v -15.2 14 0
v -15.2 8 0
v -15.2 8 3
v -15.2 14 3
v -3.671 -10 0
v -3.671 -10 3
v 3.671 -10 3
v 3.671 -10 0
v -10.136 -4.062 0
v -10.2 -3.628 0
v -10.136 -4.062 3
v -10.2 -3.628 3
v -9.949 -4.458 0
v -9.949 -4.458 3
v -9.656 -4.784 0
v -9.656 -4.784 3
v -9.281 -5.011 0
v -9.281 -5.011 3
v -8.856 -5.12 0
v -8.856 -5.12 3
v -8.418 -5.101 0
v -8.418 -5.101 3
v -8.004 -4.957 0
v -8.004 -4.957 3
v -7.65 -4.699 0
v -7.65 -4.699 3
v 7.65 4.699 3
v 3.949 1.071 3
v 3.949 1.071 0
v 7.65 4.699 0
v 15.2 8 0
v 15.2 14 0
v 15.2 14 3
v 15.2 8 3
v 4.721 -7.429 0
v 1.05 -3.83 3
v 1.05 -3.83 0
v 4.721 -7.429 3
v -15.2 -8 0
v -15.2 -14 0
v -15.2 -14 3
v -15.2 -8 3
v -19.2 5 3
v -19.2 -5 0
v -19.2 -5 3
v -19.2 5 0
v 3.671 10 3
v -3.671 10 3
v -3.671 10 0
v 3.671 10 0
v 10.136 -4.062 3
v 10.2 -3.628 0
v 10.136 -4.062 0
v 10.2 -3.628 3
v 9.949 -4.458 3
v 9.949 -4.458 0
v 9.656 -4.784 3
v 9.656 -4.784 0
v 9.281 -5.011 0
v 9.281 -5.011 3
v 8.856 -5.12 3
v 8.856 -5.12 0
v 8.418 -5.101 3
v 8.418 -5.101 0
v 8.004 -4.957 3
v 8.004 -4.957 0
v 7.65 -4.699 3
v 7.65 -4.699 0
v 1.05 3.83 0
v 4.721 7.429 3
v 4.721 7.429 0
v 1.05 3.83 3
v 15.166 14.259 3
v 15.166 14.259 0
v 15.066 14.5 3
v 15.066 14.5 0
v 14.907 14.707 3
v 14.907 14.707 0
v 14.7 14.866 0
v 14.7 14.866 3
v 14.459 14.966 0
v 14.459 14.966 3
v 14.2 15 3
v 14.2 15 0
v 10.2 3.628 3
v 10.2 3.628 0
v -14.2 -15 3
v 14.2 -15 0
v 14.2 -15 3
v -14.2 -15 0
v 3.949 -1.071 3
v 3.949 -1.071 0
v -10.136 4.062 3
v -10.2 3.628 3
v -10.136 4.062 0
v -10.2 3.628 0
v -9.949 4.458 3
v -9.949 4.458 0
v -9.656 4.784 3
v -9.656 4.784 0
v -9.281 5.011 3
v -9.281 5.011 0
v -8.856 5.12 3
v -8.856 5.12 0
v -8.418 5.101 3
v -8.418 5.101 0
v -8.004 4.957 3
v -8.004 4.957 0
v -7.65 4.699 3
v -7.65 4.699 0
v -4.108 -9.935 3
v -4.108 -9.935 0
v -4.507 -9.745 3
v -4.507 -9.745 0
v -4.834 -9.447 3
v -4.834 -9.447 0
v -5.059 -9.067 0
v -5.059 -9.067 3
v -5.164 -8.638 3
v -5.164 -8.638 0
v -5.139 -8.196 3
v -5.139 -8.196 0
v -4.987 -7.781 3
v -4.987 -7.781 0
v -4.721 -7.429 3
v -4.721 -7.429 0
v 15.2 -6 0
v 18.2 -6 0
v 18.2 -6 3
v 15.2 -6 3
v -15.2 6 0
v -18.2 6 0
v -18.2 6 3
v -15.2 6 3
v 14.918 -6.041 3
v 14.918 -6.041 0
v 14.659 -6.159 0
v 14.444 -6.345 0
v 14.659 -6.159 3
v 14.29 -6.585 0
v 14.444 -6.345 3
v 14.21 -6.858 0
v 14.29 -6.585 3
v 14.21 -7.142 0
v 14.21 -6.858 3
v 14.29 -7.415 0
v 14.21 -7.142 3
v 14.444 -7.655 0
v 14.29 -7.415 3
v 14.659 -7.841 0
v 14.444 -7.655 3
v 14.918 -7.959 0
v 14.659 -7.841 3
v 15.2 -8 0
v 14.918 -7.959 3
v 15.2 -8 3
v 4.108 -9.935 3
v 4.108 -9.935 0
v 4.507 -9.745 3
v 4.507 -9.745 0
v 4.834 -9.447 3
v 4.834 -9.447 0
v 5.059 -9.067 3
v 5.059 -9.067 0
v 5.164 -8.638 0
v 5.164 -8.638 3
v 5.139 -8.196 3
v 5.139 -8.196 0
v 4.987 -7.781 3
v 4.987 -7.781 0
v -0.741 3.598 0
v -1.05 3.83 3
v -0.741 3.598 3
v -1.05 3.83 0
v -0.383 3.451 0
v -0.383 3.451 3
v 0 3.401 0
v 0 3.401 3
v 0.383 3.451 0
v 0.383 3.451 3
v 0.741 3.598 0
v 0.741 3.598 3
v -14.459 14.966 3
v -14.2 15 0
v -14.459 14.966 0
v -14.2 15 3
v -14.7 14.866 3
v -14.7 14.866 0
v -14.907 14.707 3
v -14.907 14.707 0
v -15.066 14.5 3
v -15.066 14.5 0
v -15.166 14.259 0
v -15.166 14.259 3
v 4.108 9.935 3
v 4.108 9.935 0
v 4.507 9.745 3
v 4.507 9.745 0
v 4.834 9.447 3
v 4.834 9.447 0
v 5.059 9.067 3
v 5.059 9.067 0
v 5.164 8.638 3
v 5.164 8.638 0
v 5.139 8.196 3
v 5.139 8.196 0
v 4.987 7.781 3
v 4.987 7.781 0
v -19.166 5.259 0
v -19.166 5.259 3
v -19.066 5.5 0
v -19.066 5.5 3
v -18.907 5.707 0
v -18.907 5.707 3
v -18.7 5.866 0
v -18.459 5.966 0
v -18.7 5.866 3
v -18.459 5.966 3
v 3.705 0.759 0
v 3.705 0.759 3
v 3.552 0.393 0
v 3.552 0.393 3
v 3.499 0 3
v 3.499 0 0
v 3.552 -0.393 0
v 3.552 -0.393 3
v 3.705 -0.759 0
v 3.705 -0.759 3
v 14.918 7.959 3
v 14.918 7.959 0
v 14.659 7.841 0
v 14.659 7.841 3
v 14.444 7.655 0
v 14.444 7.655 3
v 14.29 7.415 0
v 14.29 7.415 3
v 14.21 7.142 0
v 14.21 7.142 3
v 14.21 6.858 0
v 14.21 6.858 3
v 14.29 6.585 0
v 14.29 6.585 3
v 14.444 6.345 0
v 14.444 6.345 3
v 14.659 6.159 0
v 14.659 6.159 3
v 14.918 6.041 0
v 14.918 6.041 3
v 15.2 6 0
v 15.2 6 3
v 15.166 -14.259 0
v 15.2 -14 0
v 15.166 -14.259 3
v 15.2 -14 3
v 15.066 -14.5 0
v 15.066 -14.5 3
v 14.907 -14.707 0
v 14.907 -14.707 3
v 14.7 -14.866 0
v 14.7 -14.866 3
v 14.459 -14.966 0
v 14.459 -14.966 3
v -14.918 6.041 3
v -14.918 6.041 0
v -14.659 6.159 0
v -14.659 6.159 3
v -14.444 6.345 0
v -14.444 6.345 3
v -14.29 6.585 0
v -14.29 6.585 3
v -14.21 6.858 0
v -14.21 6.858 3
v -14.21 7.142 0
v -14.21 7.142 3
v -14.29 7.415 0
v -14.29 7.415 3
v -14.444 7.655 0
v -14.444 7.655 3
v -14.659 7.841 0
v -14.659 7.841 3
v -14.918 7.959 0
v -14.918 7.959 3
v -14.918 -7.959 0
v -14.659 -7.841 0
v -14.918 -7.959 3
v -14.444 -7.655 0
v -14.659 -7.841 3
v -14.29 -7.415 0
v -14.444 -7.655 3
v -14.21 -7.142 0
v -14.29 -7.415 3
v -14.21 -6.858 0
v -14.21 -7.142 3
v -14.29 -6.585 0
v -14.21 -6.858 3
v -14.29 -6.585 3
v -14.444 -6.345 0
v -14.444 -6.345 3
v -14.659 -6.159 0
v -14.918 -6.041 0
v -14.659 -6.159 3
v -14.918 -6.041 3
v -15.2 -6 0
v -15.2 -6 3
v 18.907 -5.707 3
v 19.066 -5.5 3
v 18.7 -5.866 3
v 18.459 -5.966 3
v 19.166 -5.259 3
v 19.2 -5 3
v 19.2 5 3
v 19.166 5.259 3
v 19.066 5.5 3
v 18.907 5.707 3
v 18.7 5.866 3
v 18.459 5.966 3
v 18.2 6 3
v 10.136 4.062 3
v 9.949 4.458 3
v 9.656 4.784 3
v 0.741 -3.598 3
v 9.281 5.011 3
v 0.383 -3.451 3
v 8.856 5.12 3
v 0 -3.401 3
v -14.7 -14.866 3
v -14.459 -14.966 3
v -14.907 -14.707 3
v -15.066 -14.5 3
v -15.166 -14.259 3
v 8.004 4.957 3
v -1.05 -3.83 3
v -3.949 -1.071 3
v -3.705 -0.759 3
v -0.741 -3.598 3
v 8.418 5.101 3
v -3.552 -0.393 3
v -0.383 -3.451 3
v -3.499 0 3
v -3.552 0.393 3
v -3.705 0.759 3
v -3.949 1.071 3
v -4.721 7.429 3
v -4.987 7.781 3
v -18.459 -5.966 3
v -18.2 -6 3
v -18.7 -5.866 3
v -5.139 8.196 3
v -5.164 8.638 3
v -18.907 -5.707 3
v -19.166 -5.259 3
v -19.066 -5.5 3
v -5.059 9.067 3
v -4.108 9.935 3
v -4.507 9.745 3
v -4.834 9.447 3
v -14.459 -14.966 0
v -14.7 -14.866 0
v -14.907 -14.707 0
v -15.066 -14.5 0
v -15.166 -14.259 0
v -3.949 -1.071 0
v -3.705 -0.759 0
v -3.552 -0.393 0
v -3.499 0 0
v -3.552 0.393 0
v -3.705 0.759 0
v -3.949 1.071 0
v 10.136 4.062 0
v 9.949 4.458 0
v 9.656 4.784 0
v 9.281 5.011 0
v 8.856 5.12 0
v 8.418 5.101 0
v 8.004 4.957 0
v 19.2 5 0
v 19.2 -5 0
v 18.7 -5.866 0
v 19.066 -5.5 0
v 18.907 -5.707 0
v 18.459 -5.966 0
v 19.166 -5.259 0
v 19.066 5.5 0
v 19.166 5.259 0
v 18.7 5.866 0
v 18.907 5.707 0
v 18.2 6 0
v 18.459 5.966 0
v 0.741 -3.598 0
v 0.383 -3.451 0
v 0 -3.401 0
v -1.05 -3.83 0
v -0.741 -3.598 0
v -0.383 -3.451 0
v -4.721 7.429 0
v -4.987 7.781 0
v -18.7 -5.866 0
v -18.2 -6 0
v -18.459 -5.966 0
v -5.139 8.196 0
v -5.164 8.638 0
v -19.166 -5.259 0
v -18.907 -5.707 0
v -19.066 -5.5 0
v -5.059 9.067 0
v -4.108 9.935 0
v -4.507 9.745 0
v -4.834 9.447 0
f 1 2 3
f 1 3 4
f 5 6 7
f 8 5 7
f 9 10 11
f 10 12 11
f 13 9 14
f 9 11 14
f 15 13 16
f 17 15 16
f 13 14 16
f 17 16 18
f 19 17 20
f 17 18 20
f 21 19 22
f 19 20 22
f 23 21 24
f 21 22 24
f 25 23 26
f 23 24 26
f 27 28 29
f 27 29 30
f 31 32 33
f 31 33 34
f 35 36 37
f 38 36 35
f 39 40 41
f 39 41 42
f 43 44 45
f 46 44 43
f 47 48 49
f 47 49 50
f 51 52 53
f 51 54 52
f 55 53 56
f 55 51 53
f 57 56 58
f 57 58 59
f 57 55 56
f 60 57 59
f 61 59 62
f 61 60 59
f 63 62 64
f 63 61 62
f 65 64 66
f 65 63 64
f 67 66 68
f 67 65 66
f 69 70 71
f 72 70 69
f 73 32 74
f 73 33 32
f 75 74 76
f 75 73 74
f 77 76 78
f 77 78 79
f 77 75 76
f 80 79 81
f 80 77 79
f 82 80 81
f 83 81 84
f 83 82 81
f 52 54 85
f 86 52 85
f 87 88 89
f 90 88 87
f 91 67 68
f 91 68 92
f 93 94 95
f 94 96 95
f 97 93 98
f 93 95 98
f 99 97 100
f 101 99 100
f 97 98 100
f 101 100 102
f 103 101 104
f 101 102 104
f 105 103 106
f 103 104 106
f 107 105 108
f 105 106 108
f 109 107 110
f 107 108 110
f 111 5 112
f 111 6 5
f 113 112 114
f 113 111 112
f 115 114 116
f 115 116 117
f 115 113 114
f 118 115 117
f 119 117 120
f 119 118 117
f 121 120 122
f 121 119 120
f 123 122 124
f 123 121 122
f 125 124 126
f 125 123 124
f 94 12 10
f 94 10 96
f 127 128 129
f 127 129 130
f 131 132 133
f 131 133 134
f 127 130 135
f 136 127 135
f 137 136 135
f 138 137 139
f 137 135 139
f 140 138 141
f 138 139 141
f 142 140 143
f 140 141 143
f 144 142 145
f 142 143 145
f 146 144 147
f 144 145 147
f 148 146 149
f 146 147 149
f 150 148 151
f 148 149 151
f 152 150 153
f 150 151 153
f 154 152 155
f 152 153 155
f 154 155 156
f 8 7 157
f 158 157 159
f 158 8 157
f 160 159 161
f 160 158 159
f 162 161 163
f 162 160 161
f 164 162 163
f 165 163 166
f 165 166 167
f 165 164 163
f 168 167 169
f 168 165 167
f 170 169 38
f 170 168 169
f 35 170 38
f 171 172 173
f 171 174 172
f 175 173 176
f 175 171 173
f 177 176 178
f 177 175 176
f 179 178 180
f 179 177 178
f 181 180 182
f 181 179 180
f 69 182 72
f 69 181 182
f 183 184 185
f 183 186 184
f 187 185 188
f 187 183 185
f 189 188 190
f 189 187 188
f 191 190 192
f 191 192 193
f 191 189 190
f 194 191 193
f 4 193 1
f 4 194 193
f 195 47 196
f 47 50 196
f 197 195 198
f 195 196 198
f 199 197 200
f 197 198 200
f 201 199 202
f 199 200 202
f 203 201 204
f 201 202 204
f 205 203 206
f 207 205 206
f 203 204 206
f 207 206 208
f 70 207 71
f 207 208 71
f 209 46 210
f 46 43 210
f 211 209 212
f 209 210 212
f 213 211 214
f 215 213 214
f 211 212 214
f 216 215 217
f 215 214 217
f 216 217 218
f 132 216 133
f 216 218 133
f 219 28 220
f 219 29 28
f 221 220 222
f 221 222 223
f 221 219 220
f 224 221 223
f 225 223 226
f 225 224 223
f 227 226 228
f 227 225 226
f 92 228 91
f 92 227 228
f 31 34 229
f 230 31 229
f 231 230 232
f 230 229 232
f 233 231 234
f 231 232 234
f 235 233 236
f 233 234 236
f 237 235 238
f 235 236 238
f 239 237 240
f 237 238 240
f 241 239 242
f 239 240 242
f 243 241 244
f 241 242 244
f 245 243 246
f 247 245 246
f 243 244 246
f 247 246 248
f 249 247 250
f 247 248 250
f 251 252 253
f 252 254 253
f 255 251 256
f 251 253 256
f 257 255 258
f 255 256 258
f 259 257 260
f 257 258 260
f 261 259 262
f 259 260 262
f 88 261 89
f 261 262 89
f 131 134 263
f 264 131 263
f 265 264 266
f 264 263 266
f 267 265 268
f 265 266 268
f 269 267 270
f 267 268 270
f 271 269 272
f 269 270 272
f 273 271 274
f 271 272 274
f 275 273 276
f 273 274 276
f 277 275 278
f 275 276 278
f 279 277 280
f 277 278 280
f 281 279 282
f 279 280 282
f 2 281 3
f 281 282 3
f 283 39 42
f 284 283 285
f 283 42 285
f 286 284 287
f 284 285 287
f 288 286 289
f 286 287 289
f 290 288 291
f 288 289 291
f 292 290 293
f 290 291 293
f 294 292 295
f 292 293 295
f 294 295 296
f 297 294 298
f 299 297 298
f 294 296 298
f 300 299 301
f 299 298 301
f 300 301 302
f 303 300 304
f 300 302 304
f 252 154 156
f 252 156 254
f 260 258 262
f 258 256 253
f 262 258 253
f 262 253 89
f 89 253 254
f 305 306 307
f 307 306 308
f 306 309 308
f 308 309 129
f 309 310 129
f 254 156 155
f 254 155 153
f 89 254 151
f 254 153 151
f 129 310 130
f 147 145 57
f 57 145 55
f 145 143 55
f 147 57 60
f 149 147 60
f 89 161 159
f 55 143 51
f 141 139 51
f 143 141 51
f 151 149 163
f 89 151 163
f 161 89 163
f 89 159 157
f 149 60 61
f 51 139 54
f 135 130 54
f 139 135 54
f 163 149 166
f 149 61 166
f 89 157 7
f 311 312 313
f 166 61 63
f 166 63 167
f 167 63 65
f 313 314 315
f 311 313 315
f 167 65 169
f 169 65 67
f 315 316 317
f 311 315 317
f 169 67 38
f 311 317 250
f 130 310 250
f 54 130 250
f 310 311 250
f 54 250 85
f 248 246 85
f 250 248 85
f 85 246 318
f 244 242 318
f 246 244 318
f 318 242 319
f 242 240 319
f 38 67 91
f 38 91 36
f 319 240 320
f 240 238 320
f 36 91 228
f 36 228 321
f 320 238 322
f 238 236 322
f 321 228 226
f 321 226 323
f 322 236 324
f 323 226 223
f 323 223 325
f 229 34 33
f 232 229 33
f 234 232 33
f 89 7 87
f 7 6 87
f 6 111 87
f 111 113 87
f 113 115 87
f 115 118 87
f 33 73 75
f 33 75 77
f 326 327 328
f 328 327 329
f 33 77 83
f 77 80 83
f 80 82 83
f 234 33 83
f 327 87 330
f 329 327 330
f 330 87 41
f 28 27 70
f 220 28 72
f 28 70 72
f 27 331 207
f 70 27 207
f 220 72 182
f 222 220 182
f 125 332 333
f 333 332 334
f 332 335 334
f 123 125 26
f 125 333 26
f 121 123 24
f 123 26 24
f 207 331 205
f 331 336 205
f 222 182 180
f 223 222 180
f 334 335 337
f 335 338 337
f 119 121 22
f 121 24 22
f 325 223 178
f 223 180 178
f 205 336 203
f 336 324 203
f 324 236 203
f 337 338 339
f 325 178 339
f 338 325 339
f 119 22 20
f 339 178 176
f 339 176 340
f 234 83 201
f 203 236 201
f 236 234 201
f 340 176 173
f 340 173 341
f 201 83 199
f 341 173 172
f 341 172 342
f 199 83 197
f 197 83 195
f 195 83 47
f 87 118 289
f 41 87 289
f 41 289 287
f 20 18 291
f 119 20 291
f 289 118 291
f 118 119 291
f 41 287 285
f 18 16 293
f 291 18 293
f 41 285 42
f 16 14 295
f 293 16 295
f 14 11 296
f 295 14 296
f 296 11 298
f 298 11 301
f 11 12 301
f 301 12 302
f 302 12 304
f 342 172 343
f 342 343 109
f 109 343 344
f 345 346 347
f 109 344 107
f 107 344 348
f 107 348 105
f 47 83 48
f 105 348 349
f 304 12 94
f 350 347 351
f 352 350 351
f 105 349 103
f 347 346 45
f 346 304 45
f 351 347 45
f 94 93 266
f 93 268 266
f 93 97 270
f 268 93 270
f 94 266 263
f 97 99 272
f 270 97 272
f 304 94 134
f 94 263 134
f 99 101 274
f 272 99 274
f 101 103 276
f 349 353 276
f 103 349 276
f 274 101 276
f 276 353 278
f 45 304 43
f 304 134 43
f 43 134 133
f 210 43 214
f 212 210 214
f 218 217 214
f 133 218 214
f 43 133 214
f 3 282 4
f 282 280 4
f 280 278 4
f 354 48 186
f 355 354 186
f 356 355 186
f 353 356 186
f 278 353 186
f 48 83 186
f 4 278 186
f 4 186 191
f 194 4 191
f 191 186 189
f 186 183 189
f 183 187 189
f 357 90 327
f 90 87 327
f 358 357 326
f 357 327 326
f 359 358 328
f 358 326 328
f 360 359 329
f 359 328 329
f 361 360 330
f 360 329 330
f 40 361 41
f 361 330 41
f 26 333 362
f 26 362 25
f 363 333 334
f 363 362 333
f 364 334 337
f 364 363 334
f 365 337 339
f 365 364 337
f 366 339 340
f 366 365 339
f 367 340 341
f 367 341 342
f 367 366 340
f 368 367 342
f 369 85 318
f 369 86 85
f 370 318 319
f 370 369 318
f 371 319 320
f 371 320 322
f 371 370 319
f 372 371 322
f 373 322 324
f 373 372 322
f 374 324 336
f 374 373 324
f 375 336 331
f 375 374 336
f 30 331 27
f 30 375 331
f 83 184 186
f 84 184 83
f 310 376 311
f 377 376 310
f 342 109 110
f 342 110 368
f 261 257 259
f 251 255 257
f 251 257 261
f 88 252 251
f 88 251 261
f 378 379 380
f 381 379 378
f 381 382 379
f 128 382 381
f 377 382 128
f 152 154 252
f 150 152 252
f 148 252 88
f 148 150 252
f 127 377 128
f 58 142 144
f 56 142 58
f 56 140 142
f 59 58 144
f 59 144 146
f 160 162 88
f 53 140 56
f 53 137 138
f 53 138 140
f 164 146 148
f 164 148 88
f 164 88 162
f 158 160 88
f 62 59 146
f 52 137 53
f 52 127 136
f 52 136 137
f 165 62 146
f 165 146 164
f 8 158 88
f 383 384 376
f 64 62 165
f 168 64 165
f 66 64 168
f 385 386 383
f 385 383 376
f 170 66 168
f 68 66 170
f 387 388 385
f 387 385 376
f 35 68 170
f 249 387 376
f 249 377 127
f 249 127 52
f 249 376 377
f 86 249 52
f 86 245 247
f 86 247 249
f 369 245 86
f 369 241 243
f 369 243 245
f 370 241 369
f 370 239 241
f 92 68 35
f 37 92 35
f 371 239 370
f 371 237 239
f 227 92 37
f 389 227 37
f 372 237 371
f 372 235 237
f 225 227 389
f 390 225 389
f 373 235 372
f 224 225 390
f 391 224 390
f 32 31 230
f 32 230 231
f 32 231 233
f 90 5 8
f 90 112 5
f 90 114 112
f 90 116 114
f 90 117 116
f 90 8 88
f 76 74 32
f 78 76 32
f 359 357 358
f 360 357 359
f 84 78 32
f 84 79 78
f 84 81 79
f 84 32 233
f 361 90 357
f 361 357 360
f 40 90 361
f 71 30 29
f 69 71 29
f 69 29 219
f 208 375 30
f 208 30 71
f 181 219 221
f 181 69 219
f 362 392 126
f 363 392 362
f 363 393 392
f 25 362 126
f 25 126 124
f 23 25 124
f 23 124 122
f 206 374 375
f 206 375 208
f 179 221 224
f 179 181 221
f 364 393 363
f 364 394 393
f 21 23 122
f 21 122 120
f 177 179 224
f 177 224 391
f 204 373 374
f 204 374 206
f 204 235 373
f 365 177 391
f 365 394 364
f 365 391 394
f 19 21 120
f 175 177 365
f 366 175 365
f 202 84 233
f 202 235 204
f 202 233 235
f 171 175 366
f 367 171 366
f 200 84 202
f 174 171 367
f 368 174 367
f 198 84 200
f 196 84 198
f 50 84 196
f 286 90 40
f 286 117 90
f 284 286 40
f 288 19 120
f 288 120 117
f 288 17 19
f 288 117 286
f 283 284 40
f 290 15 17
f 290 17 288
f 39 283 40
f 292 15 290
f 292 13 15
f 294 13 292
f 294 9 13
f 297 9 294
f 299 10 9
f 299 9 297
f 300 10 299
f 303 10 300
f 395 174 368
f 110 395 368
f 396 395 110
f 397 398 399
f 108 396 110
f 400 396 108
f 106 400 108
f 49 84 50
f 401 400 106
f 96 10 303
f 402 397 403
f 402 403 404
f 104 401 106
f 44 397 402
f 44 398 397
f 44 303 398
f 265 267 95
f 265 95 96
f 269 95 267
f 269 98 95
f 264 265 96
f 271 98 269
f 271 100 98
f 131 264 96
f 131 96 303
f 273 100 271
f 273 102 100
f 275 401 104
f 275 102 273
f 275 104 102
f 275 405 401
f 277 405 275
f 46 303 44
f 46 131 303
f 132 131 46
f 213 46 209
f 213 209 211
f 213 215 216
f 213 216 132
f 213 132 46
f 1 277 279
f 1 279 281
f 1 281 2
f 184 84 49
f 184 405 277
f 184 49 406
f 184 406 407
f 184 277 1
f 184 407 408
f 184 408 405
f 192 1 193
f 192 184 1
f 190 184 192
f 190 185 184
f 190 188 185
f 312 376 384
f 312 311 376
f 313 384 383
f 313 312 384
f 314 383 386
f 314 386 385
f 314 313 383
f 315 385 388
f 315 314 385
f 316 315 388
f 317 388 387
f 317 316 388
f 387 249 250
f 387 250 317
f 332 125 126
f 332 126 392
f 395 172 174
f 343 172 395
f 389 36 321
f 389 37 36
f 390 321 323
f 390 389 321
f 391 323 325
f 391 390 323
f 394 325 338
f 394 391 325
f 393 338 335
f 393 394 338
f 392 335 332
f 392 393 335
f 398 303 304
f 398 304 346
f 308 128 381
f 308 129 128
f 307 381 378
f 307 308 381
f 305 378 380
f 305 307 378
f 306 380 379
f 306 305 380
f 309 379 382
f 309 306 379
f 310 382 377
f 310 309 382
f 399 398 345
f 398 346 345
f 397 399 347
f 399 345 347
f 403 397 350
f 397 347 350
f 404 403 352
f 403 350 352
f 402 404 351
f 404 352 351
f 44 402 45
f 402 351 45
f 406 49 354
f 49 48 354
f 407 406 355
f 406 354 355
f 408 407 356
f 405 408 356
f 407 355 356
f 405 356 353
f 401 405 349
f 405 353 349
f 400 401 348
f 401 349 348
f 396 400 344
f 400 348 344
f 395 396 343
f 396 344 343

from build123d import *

# Parameters (mm, degrees)
EXTRUDE_1_DEPTH     = 3
SKETCH_2_R          = 1
CUT_EXTRUDE_1_DEPTH = 4
SKETCH_3_W          = 20.4
SKETCH_3_H          = 20
CUT_EXTRUDE_2_DEPTH = 4
EXTRUDE_1_2_DEPTH   = 3
FILLET_1_R          = 1
FILLET_2_R          = 1.5


with BuildPart() as part:
    # 草图1 → Extrude 1 (new body)
    with BuildSketch(Plane.XY):
        Polygon((15.2, -15), (-15.2, -15), (-15.2, -6), (-19.2, -6), (-19.2, 6), (-15.2, 6), (-15.2, 15), (15.2, 15), (15.2, 6), (19.2, 6), (19.2, -6), (15.2, -6), align=None)
    extrude(amount=EXTRUDE_1_DEPTH)

    # 草图2 → 切除-拉伸1 (cut, through all)
    with BuildSketch(Plane.XY.offset(3)):
        with Locations((-15.2, 7)):
            Circle(SKETCH_2_R)
        with Locations((-15.2, -7)):
            Circle(SKETCH_2_R)
        with Locations((15.2, -7)):
            Circle(SKETCH_2_R)
        with Locations((15.2, 7)):
            Circle(SKETCH_2_R)
    extrude(amount=-CUT_EXTRUDE_1_DEPTH, mode=Mode.SUBTRACT)

    # 草图3 → 切除-拉伸2 (cut, through all)
    with BuildSketch(Plane.XY.offset(3)):
        Rectangle(SKETCH_3_W, SKETCH_3_H)
    extrude(amount=-CUT_EXTRUDE_2_DEPTH, mode=Mode.SUBTRACT)

    # 草图4 → Extrude 1 2 (add)
    with BuildSketch(Plane.XY.offset(3)):
        Polygon((-11.600142822, 8.571854322), (8.799857178, -11.428145678), (11.600142822, -8.571854322), (-8.799857178, 11.428145678), align=None)
        Polygon((-8.799857178, -11.428145678), (11.600142822, 8.571854322), (8.799857178, 11.428145678), (-11.600142822, -8.571854322), align=None)
    extrude(amount=-EXTRUDE_1_2_DEPTH)

    # 圆角1
    fillet_1_edges = [part.edges().sort_by_distance(p)[0] for p in [
        (-15.2, 15, 1.5),
        (15.2, 15, 1.5),
        (19.2, 6, 1.5),
        (19.2, -6, 1.5),
        (15.2, -15, 1.5),
        (-15.2, -15, 1.5),
        (-19.2, -6, 1.5),
        (-19.2, 6, 1.5),
    ]]
    fillet(fillet_1_edges, radius=FILLET_1_R)

    # 圆角2
    fillet_2_edges = [part.edges().sort_by_distance(p)[0] for p in [
        (-2.856851414, 0, 1.5),
        (0, 2.800834719, 1.5),
        (2.856851414, 0, 1.5),
        (0, -2.800834719, 1.5),
        (-7.343148586, -10, 1.5),
        (7.343148586, -10, 1.5),
        (10.2, 7.199165281, 1.5),
        (10.2, -7.199165281, 1.5),
        (7.343148586, 10, 1.5),
        (-7.343148586, 10, 1.5),
        (-10.2, -7.199165281, 1.5),
        (-10.2, 7.199165281, 1.5),
    ]]
    fillet(fillet_2_edges, radius=FILLET_2_R)


solid = part.part
